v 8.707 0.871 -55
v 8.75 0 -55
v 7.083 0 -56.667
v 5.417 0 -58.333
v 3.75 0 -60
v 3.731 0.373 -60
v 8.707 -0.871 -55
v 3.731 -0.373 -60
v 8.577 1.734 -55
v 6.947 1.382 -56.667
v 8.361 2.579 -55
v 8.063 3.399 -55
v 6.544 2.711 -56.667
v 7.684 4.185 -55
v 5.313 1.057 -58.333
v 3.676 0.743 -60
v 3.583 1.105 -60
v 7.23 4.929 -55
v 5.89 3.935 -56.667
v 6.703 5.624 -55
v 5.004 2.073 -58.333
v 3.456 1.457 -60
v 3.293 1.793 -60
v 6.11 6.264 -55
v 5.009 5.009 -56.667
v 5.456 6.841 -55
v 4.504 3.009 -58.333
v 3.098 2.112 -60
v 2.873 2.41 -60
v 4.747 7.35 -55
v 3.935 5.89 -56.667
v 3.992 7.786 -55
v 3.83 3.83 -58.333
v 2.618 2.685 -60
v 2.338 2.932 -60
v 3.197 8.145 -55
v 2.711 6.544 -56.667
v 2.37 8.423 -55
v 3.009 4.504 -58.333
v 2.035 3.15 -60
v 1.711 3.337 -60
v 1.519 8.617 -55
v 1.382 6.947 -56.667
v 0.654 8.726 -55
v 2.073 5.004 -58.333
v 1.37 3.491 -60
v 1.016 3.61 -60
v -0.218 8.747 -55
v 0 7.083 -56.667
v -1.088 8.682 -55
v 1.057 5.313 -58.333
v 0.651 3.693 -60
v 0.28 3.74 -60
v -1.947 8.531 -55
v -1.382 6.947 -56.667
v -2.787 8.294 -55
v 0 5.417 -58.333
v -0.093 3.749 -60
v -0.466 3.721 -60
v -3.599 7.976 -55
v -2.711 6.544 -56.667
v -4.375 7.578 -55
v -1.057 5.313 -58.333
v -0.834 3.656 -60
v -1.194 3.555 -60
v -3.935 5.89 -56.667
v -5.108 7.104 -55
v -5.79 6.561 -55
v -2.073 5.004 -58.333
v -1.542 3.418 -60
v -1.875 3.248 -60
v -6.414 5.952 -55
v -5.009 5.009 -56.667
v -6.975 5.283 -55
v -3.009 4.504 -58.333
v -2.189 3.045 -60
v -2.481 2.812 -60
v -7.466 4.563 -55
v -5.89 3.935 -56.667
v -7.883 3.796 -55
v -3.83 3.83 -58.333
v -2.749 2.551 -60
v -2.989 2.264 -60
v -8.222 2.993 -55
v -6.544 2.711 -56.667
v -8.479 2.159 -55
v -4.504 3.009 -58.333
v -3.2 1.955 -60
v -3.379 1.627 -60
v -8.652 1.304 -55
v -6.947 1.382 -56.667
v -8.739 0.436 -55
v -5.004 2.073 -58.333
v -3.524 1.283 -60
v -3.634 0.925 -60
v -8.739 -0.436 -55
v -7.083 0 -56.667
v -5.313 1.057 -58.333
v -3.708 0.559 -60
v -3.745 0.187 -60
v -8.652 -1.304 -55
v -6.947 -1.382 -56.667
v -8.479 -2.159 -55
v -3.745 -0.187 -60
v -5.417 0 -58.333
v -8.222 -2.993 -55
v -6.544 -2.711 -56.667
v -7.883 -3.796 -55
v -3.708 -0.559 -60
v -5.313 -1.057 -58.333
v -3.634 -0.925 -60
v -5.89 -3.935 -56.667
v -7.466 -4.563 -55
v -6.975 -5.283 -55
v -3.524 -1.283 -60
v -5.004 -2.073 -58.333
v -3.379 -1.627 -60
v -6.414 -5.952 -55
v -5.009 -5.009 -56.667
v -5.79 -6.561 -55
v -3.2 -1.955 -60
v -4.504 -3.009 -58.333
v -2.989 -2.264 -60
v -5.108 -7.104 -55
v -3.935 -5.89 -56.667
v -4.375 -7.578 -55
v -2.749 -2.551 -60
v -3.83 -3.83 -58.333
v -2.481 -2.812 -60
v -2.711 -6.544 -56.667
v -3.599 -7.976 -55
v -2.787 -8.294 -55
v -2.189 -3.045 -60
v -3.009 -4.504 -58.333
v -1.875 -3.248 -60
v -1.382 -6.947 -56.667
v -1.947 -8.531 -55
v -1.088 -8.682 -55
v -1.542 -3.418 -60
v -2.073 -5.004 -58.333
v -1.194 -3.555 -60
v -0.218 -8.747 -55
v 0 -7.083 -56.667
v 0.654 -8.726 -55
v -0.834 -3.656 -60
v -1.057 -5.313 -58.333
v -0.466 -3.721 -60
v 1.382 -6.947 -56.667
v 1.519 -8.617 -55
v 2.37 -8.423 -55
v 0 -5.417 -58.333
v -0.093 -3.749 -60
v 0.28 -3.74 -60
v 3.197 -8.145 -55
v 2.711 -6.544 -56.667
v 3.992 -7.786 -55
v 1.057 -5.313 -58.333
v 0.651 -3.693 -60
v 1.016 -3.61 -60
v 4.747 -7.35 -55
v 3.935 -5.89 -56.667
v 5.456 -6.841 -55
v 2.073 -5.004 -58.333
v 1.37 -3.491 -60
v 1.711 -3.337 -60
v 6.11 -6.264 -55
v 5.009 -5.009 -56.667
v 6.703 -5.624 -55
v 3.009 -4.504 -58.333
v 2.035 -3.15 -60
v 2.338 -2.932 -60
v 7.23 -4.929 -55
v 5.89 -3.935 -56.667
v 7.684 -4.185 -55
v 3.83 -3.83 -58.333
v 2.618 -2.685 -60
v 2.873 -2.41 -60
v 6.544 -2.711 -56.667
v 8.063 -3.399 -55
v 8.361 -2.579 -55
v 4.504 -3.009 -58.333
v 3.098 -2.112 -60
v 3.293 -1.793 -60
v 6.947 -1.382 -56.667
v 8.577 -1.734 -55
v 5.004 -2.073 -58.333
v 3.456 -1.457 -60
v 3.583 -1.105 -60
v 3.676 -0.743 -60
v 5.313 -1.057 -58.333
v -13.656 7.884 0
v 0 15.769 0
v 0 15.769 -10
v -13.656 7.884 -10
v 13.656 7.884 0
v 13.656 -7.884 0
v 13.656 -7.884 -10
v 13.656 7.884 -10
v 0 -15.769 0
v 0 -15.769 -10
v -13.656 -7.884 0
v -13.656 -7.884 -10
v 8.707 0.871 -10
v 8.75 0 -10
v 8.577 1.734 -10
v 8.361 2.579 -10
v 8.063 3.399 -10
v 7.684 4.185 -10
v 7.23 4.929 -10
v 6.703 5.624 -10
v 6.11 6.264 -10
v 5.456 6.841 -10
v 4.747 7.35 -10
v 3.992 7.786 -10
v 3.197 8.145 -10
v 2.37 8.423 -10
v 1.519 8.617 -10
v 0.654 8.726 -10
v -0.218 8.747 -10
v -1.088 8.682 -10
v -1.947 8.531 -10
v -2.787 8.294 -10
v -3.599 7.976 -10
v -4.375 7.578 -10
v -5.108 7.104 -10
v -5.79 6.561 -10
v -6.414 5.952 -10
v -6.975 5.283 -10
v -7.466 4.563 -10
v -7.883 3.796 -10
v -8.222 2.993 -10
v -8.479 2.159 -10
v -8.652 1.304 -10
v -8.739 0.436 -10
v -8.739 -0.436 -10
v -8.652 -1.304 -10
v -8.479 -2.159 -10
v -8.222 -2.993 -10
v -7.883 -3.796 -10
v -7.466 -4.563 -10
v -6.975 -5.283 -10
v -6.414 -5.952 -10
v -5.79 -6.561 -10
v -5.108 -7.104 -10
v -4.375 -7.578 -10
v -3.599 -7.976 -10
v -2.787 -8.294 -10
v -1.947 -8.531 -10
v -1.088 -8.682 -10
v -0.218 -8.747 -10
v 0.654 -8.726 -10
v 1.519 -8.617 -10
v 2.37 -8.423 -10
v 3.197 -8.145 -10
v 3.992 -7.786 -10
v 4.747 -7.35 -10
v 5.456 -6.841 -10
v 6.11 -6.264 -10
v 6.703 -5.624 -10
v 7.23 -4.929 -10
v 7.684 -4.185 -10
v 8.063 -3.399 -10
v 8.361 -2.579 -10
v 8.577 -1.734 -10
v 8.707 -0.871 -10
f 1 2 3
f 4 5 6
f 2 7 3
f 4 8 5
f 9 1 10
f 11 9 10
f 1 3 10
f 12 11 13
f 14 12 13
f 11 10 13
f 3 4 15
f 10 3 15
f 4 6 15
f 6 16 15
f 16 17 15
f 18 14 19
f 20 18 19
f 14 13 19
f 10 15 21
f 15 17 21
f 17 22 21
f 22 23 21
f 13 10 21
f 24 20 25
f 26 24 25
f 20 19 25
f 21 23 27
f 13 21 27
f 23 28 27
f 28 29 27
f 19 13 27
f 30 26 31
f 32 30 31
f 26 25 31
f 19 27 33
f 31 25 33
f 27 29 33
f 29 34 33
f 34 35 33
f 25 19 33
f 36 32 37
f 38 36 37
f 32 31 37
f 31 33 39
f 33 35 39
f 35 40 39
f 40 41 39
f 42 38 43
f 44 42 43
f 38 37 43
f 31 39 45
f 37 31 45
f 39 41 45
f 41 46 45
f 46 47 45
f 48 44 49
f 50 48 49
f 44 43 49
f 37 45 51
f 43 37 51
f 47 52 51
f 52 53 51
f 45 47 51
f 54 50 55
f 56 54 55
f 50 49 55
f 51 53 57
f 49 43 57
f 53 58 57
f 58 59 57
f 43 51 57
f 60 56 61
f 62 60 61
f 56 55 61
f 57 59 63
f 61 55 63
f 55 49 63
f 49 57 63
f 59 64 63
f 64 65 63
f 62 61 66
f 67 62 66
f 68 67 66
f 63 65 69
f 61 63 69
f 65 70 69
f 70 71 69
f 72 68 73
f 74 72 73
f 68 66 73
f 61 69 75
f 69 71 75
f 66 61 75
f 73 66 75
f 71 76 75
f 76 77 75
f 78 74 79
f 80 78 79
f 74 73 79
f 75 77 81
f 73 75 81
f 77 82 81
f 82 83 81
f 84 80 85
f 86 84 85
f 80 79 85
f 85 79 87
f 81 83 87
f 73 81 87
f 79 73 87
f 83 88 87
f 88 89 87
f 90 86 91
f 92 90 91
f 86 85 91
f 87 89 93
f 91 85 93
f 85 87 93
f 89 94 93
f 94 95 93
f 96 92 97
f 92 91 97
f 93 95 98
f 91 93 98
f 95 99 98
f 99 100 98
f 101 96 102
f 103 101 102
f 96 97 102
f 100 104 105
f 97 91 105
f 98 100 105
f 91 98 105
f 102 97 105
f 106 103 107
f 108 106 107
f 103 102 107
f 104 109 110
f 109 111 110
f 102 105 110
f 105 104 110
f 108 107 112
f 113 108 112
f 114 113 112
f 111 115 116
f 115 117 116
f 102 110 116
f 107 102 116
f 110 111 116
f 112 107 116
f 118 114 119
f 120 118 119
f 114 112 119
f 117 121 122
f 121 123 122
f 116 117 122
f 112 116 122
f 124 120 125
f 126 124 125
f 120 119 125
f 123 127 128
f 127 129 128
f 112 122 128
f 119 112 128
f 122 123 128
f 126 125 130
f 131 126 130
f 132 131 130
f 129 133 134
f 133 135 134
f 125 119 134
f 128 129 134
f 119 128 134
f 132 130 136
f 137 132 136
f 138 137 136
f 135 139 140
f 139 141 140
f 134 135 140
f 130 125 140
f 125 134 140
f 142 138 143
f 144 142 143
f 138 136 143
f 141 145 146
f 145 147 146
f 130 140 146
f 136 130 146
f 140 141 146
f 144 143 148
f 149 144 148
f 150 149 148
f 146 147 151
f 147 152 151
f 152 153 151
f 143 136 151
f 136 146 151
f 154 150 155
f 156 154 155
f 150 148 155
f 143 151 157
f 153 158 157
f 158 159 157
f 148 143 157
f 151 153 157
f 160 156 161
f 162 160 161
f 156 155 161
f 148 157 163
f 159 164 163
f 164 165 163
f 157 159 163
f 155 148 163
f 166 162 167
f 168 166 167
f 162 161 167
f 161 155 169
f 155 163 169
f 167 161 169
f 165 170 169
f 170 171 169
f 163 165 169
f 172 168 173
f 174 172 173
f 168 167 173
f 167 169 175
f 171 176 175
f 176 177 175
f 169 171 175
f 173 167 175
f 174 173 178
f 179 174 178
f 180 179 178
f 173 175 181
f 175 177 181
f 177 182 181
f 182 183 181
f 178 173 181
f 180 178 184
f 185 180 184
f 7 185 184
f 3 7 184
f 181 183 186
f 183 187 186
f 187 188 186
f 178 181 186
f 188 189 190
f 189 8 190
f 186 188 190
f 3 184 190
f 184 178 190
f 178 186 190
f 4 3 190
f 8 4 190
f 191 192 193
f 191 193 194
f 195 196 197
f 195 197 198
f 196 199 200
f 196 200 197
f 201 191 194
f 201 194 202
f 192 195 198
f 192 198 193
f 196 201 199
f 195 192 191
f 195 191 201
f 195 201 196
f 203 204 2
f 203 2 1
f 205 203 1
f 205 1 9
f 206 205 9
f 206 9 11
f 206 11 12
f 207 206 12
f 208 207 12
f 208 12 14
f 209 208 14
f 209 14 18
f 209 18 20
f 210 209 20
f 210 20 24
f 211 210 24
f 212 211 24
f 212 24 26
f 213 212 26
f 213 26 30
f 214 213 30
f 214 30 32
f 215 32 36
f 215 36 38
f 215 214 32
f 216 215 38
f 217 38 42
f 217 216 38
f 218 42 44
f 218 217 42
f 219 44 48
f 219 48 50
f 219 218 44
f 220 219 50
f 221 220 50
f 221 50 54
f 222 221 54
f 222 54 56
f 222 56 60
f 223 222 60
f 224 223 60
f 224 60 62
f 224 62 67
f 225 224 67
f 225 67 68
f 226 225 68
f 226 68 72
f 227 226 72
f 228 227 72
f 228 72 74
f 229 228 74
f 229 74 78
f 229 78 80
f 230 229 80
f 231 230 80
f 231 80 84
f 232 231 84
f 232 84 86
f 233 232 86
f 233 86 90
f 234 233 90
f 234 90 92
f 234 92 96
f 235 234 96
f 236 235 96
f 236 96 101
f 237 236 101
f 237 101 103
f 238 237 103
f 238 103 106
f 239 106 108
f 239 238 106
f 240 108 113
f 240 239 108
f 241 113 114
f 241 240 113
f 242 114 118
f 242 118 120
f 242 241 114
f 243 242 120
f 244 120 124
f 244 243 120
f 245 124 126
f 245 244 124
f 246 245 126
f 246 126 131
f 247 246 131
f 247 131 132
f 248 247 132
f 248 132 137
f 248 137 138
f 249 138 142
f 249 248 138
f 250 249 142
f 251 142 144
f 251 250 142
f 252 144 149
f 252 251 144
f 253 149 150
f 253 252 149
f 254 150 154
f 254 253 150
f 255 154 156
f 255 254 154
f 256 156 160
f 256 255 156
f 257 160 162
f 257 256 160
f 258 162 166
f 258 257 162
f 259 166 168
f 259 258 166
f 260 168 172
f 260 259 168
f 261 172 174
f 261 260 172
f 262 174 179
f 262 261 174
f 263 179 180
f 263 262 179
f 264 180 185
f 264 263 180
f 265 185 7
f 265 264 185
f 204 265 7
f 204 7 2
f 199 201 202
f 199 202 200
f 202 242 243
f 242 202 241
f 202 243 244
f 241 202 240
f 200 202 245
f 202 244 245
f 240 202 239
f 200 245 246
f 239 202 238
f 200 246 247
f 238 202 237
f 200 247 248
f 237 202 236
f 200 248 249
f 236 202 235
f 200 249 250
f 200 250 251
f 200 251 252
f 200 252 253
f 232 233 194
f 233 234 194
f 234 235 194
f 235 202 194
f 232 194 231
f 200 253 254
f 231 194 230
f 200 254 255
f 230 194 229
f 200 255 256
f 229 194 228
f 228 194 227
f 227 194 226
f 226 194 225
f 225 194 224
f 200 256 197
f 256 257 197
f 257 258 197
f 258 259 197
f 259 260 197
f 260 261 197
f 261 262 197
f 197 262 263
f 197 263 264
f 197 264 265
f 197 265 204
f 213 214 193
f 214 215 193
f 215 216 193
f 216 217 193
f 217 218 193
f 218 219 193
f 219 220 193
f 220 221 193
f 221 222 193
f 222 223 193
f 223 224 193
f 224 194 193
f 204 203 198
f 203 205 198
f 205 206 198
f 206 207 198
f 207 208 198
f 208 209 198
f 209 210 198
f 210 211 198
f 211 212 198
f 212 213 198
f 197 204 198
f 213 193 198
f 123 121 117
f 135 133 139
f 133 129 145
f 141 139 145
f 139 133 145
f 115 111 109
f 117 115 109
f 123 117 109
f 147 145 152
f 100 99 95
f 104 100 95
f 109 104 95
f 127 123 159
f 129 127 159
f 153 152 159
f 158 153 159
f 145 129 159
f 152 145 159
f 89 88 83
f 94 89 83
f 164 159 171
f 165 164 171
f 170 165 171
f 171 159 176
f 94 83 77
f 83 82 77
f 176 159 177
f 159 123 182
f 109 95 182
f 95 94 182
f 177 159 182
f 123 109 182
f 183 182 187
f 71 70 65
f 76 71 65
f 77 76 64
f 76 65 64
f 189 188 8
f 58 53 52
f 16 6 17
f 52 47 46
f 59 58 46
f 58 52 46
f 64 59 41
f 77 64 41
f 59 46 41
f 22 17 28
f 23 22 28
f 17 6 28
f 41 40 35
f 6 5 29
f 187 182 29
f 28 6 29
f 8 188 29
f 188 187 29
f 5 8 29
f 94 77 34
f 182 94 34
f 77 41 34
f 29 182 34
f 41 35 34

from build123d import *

# Parameters (mm, degrees)
F0_R     = 8.75
F1_DEPTH = 60
F2_DEPTH = 10
F3_SIZE  = 5


with BuildPart() as f1:
    # F0 (on Top) → F1 (new body)
    with BuildSketch(Plane.XY):
        Circle(F0_R)
    extrude(amount=-F1_DEPTH)

    # F0 (on Top) → F2 (join)
    with BuildSketch(Plane.XY):
        Polygon((13.656054, -7.884326), (13.656054, 7.884326), (0, 15.768653), (-13.656054, 7.884326), (-13.656054, -7.884326), (0, -15.768653), align=None)
        Circle(F0_R, mode=Mode.SUBTRACT)
        Circle(F0_R)
    extrude(amount=-F2_DEPTH)

    # F3
    f3_edges = [f1.edges().sort_by_distance(p)[0] for p in [
        (-8.75, 0, -60),
    ]]
    chamfer(f3_edges, length=F3_SIZE)


solid = f1.part
